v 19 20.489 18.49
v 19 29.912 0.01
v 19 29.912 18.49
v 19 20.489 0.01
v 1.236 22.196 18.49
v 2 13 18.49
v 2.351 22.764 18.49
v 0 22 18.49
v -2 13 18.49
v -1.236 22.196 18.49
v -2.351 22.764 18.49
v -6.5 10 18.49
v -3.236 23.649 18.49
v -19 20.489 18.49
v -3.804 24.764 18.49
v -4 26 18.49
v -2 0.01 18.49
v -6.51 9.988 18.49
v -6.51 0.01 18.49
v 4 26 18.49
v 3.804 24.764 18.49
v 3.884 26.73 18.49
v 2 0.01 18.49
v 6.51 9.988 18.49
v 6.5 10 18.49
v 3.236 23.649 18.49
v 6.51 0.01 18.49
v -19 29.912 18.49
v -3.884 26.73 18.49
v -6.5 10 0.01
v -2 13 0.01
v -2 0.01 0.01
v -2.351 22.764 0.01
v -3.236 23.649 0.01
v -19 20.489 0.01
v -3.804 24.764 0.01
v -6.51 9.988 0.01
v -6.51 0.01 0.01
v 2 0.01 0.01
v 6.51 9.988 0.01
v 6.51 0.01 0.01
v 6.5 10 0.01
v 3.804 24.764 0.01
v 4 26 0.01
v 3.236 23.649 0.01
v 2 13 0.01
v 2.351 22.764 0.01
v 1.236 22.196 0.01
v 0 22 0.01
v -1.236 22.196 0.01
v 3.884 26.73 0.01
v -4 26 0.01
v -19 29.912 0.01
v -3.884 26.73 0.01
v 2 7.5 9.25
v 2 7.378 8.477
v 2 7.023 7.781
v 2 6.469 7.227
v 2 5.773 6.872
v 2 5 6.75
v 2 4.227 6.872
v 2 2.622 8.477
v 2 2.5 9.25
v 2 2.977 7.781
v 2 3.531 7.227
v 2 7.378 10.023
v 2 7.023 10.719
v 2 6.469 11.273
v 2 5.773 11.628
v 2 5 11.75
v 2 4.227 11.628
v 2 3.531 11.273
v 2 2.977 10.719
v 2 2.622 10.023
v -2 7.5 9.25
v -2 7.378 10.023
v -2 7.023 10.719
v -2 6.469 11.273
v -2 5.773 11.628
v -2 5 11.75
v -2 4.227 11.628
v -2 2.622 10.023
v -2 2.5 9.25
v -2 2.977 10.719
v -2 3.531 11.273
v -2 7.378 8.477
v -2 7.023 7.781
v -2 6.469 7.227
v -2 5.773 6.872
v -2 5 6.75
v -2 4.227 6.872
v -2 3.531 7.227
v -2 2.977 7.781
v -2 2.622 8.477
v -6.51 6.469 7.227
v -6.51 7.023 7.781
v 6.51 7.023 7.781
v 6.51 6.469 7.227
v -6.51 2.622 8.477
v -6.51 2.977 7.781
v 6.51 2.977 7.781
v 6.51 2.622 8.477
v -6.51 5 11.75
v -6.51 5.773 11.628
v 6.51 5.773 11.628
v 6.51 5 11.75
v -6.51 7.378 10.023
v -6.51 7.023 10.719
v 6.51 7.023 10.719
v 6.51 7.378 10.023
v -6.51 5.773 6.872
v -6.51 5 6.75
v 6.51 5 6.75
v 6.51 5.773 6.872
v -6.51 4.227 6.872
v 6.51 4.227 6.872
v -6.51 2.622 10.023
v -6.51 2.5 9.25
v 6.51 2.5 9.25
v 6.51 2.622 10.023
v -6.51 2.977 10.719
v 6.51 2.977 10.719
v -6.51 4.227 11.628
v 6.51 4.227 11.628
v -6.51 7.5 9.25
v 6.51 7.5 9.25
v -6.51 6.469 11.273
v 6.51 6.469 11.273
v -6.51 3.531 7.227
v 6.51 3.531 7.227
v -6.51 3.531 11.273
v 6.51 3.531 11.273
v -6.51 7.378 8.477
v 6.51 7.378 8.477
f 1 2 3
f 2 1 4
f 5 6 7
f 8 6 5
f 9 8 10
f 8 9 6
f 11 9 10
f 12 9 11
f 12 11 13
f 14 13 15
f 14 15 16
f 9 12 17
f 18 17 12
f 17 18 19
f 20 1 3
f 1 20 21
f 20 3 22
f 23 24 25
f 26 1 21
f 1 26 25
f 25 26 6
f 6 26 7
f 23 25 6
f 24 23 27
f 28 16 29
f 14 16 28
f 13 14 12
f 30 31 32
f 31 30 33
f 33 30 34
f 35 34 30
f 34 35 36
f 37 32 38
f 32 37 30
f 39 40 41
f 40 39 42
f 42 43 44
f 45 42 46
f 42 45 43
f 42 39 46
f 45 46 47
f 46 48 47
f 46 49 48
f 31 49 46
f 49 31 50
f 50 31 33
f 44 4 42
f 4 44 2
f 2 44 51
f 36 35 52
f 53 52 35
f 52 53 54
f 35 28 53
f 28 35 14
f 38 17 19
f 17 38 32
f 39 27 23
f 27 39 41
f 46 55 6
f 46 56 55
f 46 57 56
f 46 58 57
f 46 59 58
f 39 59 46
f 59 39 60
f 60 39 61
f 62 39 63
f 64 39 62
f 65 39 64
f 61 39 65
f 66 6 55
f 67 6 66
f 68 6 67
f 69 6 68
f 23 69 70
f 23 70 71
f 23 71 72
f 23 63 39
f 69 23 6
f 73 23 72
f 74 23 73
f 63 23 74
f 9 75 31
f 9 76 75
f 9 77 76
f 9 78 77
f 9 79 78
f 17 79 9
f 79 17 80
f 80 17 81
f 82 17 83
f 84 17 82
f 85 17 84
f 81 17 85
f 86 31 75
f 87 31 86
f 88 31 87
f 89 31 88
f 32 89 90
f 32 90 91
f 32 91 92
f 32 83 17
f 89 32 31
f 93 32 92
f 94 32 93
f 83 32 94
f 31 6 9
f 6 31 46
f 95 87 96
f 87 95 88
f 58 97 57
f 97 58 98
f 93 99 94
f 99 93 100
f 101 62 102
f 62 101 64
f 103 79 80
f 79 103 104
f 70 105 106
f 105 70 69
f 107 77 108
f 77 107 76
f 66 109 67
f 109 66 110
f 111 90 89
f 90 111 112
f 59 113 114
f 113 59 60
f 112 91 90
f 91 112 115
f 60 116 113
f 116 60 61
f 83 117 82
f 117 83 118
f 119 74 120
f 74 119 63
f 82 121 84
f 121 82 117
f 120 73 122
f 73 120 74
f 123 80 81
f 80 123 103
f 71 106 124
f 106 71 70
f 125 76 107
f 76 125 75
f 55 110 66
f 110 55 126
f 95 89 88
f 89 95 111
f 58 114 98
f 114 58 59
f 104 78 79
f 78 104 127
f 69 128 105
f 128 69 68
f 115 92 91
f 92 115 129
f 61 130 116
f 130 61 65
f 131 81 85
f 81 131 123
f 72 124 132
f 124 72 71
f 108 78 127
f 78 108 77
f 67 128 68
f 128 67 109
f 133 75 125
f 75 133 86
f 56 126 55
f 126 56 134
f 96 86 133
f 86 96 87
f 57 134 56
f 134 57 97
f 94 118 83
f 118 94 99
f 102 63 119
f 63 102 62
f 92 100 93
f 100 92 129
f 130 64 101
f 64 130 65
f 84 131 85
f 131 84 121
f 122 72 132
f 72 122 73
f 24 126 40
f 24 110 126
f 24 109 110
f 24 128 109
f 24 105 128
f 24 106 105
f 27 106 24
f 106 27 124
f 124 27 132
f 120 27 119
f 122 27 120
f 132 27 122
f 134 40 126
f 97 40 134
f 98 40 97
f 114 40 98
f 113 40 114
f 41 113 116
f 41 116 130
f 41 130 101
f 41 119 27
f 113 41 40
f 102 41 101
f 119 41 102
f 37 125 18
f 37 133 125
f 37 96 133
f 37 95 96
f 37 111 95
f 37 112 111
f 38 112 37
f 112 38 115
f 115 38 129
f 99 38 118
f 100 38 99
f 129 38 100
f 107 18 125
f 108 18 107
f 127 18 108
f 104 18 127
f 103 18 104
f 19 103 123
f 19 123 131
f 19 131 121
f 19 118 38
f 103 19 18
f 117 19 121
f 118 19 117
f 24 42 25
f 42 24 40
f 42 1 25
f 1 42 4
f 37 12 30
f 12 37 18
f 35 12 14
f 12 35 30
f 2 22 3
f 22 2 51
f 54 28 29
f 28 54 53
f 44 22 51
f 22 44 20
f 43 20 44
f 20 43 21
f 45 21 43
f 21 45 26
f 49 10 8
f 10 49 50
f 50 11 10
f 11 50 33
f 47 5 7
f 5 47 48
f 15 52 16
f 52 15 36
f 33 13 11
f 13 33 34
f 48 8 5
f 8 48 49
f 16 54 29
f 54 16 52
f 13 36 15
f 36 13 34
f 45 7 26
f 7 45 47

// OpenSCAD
// include <pw_primitives.scad>;

length = 30; // total length in Y
width = 38; // total width in X
height = 18.5; // height in Z
back_width = 13; // width in X across back face
fulcrum_hole_diam = 5;
fulcrum_hole_forward = 5;
hbackw = back_width/2;
arm_cutout_width = 4;
arm_cutout_length = 13; // centre
back_length = 10; // length in Y from back face to start of outer angle
back_side_angle = 40; // angle of back outer sides
front_notch_diameter = 8; // diameter of circle for front notch
// for right triangle ABC with B=90deg, where we know length AB and angle A,
// C=90-A, BC = AB*sin(A)/sin(C), CA=AB*sin(B)/sin(C).
diag_back_length = ((width-back_width)/2)*sin(back_side_angle)/sin(90-back_side_angle);
diag_back_width = ((width-back_width)/2)/sin(90-back_side_angle);
// for right triangle ABC with B=90deg, where we know lengths AB and BC,
// A=atan(BC/AB)
front_notch_r = front_notch_diameter/2;
front_angle_forward = length-front_notch_r;
front_side_angle = atan(front_notch_r/(width/2));
fac_wid = (width/2)/sin(90-front_side_angle);

module front_corner_rotated_cube(x, y, z, angle) {
    translate([0, y, 0]) rotate([0, 0, angle]) translate([0, -y, 0])
        cube([x, y, z]);
};

$fn = 20;
difference() {
    // the whole area - slightly high and smaller to make every other
    // subtraction not face-overlap
    translate([-width/2, 0.01, 0.01]) cube([width, length-0.02, height-0.02]);
    // the central cutout for the arm
    translate([-arm_cutout_width/2, 0, 0])
        cube([arm_cutout_width, arm_cutout_length, height]);
    // the fulcrum hole
    translate([-back_width/2-0.02, back_length/2, height/2]) rotate([0, 90, 0]) 
        cylinder(h=back_width+0.04, d=fulcrum_hole_diam);
    // the back flat faces
    mirror([0, 0, 0]) translate([back_width/2+0.01, 0, 0]) 
        cube([(width-back_width)/2, back_length, height]);
    mirror([1, 0, 0]) translate([back_width/2+0.01, 0, 0]) 
        cube([(width-back_width)/2, back_length, height]);
    // the back angled faces
    mirror([0, 0, 0]) translate([back_width/2, back_length-diag_back_length, 0]) 
        front_corner_rotated_cube(
            diag_back_width, diag_back_length, height, back_side_angle
        );
    mirror([1, 0, 0]) translate([back_width/2, back_length-diag_back_length, 0]) 
        front_corner_rotated_cube(
            diag_back_width, diag_back_length, height, back_side_angle
        );
    // the front angled faces
    mirror([0, 0, 0]) translate([0, front_angle_forward, 0])
        front_corner_rotated_cube(fac_wid, front_notch_r, height, front_side_angle);
    mirror([1, 0, 0]) translate([0, front_angle_forward, 0])
        front_corner_rotated_cube(fac_wid, front_notch_r, height, front_side_angle);
    // the front centre notch
    translate([0, length-(front_notch_diameter/2), 0])
        cylinder(h=height, d=front_notch_diameter);
};
